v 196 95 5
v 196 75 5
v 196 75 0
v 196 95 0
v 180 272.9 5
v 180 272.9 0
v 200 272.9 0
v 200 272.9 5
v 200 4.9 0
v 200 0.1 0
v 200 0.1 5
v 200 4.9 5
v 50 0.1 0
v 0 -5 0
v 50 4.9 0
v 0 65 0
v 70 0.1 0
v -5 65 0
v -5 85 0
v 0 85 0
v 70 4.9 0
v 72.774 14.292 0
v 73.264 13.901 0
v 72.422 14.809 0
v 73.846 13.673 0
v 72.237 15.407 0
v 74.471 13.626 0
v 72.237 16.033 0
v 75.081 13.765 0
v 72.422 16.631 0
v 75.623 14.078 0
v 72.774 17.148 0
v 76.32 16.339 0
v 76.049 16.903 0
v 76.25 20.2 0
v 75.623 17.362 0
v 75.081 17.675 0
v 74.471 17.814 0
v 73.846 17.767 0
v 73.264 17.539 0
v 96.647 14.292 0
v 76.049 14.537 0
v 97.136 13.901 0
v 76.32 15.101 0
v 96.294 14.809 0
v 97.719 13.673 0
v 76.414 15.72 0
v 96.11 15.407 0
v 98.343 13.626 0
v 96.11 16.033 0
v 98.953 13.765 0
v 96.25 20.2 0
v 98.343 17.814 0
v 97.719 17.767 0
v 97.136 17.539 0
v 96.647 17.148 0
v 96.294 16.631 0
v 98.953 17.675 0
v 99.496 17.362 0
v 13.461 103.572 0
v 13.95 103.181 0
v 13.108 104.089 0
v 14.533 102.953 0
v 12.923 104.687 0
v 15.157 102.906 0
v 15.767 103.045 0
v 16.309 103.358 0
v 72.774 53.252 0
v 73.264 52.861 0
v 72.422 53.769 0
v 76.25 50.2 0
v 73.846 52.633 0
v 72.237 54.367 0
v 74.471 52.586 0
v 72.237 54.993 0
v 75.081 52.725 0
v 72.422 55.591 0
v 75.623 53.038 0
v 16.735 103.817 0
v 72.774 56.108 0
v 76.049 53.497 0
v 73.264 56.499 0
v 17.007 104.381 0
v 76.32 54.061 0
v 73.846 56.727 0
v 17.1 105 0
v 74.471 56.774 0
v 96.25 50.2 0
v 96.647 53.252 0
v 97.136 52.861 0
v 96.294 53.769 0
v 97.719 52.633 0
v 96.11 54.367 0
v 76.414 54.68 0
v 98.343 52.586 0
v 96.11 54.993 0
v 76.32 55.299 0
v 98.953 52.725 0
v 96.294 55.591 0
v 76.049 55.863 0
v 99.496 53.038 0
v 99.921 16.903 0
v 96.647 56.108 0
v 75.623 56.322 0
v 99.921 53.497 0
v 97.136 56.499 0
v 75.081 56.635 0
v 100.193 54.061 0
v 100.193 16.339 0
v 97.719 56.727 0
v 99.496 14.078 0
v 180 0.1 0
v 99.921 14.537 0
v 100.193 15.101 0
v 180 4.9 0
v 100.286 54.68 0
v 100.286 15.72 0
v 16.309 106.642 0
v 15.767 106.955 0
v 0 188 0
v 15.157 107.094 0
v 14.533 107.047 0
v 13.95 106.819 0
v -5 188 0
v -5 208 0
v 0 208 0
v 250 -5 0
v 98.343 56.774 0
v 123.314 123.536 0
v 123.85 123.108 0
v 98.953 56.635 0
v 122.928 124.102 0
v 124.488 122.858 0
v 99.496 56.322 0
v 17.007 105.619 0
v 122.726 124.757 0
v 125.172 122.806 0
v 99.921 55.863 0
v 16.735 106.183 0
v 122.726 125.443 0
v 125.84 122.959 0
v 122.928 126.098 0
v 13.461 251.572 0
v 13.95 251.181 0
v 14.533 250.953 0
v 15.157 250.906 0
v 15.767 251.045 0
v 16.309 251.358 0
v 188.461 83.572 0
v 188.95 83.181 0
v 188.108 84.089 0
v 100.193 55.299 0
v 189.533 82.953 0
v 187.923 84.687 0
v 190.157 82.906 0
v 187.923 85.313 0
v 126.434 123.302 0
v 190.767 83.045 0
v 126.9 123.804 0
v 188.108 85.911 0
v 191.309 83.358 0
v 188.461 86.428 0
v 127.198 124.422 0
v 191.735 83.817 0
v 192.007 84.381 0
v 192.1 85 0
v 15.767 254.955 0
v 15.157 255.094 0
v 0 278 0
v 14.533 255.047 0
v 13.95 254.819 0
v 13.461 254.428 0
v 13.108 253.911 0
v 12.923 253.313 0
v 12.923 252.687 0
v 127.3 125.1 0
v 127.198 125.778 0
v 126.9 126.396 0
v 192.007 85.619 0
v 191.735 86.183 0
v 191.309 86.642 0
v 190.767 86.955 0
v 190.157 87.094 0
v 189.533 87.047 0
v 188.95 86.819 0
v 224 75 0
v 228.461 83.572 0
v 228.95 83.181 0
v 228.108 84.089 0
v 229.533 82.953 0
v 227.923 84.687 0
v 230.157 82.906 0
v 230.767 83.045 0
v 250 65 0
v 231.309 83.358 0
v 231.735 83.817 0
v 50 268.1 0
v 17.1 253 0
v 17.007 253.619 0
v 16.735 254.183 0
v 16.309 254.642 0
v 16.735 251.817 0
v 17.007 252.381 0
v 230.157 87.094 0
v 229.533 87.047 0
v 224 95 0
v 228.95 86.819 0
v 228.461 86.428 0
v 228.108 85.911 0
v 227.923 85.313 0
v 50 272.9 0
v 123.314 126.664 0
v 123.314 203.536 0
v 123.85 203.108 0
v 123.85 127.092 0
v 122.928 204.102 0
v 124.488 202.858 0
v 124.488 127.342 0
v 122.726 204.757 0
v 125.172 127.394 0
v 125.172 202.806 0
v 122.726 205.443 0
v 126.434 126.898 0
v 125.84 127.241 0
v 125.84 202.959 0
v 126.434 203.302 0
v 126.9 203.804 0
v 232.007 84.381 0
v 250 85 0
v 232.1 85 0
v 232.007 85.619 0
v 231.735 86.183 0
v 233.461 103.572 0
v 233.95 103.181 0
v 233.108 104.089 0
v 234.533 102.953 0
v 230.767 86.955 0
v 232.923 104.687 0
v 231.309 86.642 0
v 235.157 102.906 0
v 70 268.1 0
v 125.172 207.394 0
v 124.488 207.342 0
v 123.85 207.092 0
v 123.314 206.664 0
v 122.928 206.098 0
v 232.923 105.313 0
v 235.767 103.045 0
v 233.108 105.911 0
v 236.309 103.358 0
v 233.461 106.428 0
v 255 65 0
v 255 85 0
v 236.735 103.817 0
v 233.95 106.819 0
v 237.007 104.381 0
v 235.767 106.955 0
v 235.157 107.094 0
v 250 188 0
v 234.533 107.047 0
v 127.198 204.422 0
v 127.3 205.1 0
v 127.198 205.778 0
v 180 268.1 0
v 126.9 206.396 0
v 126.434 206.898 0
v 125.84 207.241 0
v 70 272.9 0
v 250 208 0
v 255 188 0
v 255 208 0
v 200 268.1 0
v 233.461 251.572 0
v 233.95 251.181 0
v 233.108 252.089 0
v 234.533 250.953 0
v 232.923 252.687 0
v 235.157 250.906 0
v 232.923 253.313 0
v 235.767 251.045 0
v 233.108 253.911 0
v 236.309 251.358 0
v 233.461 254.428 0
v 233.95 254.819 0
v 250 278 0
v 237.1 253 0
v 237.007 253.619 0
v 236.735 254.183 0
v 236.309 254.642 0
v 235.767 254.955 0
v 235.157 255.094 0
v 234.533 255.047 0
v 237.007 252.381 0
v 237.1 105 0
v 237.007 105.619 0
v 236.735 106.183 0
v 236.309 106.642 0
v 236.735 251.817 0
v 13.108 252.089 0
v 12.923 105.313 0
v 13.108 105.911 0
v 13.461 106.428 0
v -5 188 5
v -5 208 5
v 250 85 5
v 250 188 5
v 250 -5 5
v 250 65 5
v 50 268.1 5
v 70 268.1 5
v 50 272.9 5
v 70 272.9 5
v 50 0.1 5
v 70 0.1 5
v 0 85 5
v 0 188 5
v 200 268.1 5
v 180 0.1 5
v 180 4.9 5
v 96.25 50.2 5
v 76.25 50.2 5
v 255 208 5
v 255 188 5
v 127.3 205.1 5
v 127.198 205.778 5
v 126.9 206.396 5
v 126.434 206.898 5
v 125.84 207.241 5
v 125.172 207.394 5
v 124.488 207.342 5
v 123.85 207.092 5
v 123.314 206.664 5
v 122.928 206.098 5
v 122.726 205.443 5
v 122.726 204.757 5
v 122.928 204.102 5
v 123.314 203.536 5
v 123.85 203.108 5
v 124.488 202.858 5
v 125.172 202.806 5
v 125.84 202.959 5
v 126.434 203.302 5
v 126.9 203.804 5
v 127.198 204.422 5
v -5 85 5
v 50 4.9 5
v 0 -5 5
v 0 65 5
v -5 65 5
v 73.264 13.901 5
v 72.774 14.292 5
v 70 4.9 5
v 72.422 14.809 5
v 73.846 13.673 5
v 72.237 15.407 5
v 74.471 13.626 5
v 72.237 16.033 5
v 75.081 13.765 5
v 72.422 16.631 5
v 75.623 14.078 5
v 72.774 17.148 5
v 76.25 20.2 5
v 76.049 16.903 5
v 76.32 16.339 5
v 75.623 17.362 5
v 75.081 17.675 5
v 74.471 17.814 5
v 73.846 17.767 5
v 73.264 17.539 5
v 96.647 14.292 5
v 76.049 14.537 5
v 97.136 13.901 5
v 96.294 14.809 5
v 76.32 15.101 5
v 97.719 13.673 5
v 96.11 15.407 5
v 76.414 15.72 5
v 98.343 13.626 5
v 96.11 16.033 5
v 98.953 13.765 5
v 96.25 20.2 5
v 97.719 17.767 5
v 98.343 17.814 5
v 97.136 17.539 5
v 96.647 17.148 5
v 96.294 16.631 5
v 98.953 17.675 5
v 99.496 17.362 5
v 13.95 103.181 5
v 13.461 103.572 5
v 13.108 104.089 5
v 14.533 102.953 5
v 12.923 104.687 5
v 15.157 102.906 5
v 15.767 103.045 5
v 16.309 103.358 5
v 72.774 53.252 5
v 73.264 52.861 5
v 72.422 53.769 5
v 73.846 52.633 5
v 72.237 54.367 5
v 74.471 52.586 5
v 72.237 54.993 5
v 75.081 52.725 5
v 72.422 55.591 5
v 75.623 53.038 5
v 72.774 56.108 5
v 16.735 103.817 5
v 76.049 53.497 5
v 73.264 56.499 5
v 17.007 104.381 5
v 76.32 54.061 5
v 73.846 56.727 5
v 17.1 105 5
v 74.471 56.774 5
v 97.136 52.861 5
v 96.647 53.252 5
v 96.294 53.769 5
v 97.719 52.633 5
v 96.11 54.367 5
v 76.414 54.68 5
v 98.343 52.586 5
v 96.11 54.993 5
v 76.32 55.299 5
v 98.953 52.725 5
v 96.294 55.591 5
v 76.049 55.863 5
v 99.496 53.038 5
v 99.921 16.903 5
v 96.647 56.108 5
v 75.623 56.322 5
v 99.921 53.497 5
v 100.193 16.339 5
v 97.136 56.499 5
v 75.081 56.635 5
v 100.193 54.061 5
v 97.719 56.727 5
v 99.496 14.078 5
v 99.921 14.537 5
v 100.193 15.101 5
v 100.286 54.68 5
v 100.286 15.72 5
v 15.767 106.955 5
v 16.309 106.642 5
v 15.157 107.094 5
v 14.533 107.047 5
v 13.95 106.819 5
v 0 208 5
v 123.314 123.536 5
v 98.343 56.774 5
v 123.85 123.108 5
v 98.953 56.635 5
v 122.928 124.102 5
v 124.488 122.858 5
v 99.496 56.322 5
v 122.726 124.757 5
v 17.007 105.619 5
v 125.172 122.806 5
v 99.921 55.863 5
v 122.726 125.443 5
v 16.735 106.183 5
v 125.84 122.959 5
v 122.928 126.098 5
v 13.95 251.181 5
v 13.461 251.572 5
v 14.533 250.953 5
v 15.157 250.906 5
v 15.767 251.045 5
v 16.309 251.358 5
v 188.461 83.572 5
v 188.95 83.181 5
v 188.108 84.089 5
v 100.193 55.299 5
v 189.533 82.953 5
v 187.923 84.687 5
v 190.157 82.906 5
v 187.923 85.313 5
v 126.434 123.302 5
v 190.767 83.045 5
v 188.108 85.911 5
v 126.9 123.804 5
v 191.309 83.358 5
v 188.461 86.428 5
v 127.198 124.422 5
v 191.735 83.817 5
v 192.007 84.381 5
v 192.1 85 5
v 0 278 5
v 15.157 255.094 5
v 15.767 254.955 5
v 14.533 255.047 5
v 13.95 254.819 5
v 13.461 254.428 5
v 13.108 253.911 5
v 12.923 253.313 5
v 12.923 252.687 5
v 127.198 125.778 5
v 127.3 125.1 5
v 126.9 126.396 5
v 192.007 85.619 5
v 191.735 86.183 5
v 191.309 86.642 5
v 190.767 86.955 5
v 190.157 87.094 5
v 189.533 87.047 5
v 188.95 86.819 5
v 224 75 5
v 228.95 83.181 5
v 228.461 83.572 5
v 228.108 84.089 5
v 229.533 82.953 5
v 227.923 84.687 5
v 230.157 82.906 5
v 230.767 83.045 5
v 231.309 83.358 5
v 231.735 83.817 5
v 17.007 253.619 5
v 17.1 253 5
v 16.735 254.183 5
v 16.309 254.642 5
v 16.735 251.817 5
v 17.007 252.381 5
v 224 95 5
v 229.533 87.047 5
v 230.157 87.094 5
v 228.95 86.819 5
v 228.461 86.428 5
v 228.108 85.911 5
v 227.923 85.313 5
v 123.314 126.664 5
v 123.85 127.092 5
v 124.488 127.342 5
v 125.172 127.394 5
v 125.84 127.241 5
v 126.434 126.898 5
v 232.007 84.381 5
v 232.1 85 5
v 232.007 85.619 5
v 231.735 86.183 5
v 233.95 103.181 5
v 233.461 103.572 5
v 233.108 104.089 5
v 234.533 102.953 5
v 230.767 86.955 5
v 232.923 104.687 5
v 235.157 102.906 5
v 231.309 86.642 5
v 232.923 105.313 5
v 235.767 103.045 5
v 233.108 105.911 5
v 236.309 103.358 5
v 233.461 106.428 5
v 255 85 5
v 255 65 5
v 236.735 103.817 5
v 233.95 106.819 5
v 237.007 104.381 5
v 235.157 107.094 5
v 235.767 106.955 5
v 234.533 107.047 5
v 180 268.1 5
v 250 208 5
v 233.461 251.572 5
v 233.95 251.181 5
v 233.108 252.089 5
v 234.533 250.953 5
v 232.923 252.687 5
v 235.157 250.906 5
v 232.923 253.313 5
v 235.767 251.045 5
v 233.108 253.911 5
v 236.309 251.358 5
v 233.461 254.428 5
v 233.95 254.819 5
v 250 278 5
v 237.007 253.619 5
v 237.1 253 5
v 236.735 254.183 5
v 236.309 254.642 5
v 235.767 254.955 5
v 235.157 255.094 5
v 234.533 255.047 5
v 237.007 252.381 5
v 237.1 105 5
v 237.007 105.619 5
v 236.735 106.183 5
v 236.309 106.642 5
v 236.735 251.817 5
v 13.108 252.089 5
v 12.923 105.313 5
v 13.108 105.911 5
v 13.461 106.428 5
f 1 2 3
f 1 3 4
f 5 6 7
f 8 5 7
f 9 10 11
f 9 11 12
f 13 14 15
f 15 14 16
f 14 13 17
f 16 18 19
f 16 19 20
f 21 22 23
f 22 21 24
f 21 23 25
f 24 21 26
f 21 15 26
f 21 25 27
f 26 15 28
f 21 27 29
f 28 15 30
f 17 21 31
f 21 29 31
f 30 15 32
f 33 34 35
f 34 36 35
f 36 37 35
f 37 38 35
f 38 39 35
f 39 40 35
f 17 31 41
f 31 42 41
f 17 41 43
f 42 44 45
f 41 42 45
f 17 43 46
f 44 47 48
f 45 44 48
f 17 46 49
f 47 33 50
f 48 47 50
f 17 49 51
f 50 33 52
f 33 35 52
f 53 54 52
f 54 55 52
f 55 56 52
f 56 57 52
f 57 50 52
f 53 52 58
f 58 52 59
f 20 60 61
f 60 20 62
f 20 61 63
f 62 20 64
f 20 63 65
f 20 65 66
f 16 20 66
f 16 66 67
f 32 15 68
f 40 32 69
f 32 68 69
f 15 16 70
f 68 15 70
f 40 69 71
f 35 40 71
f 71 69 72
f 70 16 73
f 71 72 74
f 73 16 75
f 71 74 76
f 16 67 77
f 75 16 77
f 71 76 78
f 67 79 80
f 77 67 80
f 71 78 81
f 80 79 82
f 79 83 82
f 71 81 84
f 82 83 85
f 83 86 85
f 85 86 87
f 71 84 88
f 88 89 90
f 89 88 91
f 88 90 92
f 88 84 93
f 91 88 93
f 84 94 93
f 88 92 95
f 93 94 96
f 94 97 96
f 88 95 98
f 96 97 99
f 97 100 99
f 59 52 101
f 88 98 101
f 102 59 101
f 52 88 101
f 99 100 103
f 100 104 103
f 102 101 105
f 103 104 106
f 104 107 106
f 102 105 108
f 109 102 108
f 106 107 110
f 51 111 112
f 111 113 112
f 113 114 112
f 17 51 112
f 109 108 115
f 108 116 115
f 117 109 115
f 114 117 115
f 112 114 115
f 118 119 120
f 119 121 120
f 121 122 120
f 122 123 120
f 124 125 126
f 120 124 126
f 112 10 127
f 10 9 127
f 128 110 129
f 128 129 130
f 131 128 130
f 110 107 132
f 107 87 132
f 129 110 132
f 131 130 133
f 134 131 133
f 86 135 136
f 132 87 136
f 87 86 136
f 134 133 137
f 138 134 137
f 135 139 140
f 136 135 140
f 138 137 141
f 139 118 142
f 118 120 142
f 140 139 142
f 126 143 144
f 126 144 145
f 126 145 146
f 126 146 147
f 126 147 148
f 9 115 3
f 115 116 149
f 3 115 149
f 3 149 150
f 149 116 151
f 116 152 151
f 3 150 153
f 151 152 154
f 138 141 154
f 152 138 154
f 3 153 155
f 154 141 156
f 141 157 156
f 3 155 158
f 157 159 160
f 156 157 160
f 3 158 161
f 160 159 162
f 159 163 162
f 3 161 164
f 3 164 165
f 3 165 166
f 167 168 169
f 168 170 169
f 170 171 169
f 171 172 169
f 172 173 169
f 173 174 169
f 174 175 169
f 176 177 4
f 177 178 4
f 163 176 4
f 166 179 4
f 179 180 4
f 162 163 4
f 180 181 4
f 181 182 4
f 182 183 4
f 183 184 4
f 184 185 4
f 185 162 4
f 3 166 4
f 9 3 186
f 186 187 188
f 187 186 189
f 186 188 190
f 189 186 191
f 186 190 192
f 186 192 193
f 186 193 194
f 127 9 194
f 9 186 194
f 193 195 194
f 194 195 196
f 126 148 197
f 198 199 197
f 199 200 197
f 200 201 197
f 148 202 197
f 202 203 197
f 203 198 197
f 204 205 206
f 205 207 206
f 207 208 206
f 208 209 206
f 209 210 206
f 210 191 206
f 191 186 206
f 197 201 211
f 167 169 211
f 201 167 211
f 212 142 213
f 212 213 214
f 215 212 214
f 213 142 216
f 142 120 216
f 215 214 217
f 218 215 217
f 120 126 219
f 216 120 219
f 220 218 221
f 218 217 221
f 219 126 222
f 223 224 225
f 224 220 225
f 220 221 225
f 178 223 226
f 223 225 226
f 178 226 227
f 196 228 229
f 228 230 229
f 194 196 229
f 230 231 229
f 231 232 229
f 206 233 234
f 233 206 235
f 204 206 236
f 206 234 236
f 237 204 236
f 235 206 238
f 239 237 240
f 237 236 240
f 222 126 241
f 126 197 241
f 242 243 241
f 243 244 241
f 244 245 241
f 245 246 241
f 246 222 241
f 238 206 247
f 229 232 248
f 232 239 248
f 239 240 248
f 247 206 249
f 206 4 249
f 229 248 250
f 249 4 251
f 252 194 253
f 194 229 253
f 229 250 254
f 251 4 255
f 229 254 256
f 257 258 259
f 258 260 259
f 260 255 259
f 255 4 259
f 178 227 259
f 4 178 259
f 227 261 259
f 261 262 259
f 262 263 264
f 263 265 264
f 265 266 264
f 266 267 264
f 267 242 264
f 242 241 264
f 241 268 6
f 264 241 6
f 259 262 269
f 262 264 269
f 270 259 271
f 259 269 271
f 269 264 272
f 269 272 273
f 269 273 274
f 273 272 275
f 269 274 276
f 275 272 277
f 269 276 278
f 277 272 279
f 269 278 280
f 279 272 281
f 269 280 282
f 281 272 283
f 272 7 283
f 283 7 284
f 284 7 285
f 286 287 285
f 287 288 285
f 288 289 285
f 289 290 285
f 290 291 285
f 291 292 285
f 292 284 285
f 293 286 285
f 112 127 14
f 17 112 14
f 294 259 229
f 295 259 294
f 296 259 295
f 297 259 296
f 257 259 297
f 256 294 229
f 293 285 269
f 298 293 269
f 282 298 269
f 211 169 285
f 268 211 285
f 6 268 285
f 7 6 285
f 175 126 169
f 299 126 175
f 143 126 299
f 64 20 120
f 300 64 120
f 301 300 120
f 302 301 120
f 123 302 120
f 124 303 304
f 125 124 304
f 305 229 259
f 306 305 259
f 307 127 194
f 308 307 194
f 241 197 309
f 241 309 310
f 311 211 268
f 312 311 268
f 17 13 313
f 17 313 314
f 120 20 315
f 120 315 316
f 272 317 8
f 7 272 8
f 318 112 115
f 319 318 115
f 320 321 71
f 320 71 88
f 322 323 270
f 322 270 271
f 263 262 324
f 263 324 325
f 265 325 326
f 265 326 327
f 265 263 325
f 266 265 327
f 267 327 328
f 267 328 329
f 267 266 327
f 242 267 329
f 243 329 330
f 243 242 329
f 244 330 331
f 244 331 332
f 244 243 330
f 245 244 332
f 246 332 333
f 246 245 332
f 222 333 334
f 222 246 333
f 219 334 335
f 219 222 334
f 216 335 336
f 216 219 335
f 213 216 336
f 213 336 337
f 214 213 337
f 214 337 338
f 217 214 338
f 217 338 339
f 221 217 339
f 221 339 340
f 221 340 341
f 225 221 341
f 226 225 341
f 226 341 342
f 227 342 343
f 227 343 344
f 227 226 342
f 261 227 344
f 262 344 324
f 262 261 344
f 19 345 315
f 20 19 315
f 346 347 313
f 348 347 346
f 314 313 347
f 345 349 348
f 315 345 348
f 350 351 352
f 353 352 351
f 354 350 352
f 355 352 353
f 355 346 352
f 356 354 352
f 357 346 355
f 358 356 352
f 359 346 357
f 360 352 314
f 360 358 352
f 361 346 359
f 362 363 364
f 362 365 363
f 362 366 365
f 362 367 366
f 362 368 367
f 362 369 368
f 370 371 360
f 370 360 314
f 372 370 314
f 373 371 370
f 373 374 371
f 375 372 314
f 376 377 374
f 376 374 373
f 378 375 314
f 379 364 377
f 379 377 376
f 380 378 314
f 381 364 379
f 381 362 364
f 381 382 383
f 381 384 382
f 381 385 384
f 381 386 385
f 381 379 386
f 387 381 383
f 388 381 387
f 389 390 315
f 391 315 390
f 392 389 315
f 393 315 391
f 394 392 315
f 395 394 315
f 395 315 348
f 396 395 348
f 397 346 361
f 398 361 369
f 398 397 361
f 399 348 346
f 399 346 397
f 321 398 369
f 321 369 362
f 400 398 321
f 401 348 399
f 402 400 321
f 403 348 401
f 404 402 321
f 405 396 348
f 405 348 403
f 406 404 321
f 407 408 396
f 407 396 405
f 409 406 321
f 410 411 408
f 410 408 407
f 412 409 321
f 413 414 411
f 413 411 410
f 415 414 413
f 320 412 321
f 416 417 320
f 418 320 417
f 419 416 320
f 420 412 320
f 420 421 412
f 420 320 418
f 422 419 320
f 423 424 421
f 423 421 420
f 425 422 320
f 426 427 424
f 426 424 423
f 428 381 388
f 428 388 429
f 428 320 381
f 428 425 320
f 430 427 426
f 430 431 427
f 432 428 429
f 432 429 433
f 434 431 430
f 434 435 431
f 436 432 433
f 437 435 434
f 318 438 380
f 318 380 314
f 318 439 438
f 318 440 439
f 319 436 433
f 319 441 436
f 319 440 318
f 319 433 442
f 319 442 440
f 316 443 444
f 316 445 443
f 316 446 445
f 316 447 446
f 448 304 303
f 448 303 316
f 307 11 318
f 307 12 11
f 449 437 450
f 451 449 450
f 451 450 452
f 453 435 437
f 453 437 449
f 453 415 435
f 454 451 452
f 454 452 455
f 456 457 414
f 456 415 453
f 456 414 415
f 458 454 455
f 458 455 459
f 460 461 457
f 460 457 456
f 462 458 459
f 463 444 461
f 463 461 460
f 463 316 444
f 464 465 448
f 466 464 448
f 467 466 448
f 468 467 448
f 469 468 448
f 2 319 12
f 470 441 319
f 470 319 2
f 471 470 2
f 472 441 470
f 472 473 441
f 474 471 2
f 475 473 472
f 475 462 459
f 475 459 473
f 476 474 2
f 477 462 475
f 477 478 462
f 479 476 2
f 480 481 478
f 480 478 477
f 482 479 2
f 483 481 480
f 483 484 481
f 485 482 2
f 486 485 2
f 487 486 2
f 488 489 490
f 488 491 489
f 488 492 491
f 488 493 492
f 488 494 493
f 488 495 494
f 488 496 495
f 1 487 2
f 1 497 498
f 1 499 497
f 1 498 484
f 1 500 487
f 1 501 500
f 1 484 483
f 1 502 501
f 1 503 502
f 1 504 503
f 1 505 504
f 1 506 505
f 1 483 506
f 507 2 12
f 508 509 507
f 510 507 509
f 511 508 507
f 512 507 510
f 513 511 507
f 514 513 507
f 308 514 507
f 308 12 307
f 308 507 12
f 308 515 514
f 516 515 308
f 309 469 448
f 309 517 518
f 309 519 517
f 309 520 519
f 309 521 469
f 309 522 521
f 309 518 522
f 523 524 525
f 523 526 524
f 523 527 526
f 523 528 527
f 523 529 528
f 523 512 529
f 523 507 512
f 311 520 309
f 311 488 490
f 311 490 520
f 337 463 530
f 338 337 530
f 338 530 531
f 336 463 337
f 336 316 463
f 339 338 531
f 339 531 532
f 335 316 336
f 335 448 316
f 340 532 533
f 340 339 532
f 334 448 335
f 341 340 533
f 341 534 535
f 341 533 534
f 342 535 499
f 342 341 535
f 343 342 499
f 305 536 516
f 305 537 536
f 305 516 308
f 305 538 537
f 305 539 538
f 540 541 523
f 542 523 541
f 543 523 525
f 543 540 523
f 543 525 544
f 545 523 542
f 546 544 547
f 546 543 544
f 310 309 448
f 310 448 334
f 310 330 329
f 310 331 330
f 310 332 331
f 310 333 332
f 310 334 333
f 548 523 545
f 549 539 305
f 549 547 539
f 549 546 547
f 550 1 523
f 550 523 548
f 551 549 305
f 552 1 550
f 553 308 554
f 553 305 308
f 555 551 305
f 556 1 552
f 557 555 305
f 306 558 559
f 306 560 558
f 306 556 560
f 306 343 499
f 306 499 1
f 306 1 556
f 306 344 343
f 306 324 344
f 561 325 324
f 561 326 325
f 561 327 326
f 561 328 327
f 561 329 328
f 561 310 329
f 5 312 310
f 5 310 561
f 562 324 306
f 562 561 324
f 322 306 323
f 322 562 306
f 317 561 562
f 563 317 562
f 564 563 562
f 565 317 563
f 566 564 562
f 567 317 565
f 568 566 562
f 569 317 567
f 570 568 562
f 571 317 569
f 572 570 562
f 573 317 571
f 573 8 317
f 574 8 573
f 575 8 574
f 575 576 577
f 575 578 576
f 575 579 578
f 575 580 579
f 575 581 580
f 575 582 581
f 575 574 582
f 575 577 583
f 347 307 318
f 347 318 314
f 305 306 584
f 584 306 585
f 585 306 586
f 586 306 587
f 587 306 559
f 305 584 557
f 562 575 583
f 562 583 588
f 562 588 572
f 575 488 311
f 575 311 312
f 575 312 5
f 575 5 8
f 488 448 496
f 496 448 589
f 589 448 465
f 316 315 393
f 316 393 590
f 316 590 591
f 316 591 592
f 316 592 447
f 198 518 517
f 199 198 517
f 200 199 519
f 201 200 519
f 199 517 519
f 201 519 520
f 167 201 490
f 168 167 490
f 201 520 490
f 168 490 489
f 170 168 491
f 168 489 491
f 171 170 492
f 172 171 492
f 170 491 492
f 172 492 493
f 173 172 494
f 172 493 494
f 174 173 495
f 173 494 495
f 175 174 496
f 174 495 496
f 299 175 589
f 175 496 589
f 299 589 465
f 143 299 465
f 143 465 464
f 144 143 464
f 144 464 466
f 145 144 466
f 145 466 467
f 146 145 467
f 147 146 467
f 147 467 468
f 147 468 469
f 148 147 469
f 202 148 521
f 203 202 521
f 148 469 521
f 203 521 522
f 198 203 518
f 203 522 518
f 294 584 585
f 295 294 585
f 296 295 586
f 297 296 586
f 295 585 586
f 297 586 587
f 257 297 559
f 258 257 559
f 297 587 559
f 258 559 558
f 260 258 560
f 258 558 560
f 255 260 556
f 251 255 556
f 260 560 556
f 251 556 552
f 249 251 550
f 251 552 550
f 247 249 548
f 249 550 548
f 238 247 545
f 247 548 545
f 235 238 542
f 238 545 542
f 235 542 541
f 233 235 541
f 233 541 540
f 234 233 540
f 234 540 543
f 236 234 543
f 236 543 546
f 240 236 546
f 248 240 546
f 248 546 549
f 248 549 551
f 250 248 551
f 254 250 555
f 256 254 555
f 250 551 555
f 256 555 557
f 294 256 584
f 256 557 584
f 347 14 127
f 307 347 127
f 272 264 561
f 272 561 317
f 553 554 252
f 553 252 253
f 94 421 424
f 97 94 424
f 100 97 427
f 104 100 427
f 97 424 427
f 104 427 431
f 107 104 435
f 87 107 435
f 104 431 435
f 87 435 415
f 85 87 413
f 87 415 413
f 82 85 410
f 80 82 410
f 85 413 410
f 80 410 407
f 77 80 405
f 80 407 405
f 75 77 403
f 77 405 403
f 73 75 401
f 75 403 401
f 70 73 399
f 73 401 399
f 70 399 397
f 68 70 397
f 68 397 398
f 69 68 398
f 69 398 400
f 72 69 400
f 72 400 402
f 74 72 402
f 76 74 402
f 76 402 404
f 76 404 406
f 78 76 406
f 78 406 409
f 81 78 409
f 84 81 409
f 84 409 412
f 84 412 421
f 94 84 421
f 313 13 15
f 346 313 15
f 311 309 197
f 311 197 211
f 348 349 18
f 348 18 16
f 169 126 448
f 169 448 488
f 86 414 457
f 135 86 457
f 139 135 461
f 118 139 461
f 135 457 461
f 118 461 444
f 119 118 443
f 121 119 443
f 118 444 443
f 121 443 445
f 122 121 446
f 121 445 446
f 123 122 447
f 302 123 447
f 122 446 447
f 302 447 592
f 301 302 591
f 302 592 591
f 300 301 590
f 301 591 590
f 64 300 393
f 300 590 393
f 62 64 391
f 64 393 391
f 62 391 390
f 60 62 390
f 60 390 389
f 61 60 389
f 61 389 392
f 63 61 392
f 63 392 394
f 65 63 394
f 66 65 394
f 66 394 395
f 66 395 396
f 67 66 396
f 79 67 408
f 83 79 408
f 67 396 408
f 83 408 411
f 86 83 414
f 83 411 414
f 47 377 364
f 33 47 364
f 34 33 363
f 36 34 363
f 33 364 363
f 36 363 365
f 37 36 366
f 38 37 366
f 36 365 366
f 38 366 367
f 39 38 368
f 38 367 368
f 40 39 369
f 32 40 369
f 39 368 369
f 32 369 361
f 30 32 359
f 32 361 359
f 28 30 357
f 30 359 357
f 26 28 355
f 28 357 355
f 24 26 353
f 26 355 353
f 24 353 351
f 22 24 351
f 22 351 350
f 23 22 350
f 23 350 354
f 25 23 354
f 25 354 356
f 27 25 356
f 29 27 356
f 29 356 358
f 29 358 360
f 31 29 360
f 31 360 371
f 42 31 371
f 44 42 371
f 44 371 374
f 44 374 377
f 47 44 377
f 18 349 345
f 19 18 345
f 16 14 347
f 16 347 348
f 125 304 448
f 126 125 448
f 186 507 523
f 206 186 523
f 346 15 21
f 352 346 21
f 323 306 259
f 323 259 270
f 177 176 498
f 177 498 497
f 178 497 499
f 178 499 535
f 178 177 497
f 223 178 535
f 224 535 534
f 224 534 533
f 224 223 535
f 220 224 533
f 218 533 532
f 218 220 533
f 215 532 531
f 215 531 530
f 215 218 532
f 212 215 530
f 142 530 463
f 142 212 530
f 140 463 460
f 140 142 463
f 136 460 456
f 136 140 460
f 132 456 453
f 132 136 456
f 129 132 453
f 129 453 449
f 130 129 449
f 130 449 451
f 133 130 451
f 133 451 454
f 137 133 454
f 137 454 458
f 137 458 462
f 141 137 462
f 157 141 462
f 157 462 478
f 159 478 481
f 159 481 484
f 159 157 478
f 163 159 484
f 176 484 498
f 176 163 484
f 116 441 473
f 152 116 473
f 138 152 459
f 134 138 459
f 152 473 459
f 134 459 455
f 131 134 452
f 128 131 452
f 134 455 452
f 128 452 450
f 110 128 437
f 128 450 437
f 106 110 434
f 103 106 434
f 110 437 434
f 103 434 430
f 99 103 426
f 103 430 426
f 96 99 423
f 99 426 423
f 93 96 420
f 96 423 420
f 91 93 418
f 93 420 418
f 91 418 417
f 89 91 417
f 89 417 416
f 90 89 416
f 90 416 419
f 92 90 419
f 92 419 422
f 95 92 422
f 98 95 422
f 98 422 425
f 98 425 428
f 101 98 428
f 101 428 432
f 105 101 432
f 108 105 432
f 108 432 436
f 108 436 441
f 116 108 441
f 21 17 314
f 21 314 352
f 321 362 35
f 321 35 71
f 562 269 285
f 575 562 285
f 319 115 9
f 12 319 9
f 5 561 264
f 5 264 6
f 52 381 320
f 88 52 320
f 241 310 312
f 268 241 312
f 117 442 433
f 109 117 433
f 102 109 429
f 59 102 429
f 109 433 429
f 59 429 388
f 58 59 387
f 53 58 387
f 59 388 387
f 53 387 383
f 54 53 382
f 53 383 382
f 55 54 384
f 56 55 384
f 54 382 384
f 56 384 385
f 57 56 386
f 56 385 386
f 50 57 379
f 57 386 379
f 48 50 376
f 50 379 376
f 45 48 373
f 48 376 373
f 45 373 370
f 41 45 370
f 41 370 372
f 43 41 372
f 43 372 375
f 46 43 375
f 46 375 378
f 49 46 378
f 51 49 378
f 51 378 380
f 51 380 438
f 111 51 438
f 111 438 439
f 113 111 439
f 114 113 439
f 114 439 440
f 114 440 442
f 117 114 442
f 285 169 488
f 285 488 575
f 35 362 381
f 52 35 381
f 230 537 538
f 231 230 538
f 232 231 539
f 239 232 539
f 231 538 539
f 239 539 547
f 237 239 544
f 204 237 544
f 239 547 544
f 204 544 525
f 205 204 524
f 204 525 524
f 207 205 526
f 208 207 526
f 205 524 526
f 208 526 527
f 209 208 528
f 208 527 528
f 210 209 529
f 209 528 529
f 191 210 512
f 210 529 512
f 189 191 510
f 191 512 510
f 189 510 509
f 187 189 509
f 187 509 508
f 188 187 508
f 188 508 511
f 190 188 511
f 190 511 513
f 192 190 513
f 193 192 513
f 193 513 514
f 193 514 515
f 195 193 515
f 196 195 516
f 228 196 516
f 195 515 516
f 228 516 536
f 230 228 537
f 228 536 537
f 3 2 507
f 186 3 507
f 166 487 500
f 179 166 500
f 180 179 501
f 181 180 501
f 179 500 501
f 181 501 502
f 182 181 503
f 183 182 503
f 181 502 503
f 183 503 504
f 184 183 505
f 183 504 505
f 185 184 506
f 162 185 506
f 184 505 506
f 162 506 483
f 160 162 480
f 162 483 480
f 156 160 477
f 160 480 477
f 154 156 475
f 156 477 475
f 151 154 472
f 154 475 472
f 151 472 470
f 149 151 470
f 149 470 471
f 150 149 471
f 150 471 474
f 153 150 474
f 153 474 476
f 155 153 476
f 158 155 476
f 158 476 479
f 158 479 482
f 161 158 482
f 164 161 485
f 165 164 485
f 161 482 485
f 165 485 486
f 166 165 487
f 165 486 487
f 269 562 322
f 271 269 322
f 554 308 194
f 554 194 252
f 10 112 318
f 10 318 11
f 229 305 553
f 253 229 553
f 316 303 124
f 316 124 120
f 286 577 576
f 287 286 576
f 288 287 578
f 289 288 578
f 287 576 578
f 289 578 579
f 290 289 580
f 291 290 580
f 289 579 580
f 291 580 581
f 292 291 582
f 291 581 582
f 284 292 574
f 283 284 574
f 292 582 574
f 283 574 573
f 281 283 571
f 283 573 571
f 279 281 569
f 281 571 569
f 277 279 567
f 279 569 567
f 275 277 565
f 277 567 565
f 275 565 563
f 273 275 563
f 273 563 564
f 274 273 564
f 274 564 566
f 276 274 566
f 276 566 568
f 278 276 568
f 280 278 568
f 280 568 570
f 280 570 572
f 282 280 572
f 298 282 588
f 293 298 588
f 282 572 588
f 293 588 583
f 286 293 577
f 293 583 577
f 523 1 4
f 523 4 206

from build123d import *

# Parameters (mm, degrees)
SKETCH1_W           = 250
SKETCH1_H           = 283
SKETCH1_R           = 2.3
SKETCH1_W_2         = 20
SKETCH1_H_2         = 4.8
BOSS_EXTRUDE1_DEPTH = 5
SKETCH2_W           = 5
SKETCH2_H           = 20
BOSS_EXTRUDE2_DEPTH = 5
SKETCH3_R           = 2.1
SKETCH3_W           = 28
SKETCH3_H           = 20
CUT_EXTRUDE1_DEPTH  = 5
SKETCH4_W           = 20
SKETCH4_H           = 30
CUT_EXTRUDE2_DEPTH  = 5
SKETCH5_R           = 2.1
CUT_EXTRUDE3_DEPTH  = 6
SKETCH6_R           = 2.1
CUT_EXTRUDE4_DEPTH  = 5
SKETCH7_R           = 2.1
CUT_EXTRUDE5_DEPTH  = 5


with BuildPart() as part:
    # Sketch1 → Boss-Extrude1 (new body)
    with BuildSketch(Plane.XY):
        with Locations((125, 136.5)):
            Rectangle(SKETCH1_W, SKETCH1_H)
        with Locations((125, 125.1)):
            Circle(SKETCH1_R, mode=Mode.SUBTRACT)
        with Locations((125, 205.1)):
            Circle(SKETCH1_R, mode=Mode.SUBTRACT)
        with Locations((60, 2.5)):
            Rectangle(SKETCH1_W_2, SKETCH1_H_2, mode=Mode.SUBTRACT)
        with Locations((190, 2.5)):
            Rectangle(SKETCH1_W_2, SKETCH1_H_2, mode=Mode.SUBTRACT)
        with Locations((190, 270.5)):
            Rectangle(SKETCH1_W_2, SKETCH1_H_2, mode=Mode.SUBTRACT)
        with Locations((60, 270.5)):
            Rectangle(SKETCH1_W_2, SKETCH1_H_2, mode=Mode.SUBTRACT)
    extrude(amount=BOSS_EXTRUDE1_DEPTH)

    # Sketch2 → Boss-Extrude2 (add)
    with BuildSketch(Plane.XY.offset(5)):
        with Locations((-2.5, 198)):
            Rectangle(SKETCH2_W, SKETCH2_H)
        with Locations((-2.5, 75)):
            Rectangle(SKETCH2_W, SKETCH2_H)
        with Locations((252.5, 198)):
            Rectangle(SKETCH2_W, SKETCH2_H)
        with Locations((252.5, 75)):
            Rectangle(SKETCH2_W, SKETCH2_H)
    extrude(amount=-BOSS_EXTRUDE2_DEPTH)

    # Sketch3 → Cut-Extrude1 (cut)
    with BuildSketch(Plane.XY.offset(5)):
        with Locations((190, 85)):
            Circle(SKETCH3_R)
        with Locations((230, 85)):
            Circle(SKETCH3_R)
        with Locations((210, 85)):
            Rectangle(SKETCH3_W, SKETCH3_H)
    extrude(amount=-CUT_EXTRUDE1_DEPTH, mode=Mode.SUBTRACT)

    # Sketch4 → Cut-Extrude2 (cut)
    with BuildSketch(Plane.XY.offset(5)):
        with Locations((86.25, 35.2)):
            Rectangle(SKETCH4_W, SKETCH4_H)
    extrude(amount=-CUT_EXTRUDE2_DEPTH, mode=Mode.SUBTRACT)

    # Sketch5 → Cut-Extrude3 (cut, through all)
    with BuildSketch(Plane.XY.offset(5)):
        with Locations((98.18627451, 15.72)):
            Circle(SKETCH5_R)
        with Locations((74.31372549, 15.72)):
            Circle(SKETCH5_R)
        with Locations((74.31372549, 54.68)):
            Circle(SKETCH5_R)
        with Locations((98.18627451, 54.68)):
            Circle(SKETCH5_R)
    extrude(amount=-CUT_EXTRUDE3_DEPTH, mode=Mode.SUBTRACT)

    # Sketch6 → Cut-Extrude4 (cut)
    with BuildSketch(Plane.XY.offset(5)):
        with Locations((235, 253)):
            Circle(SKETCH6_R)
        with Locations((15, 253)):
            Circle(SKETCH6_R)
    extrude(amount=-CUT_EXTRUDE4_DEPTH, mode=Mode.SUBTRACT)

    # Sketch7 → Cut-Extrude5 (cut)
    with BuildSketch(Plane.XY.offset(5)):
        with Locations((15, 105)):
            Circle(SKETCH7_R)
        with Locations((235, 105)):
            Circle(SKETCH7_R)
    extrude(amount=-CUT_EXTRUDE5_DEPTH, mode=Mode.SUBTRACT)


solid = part.part
